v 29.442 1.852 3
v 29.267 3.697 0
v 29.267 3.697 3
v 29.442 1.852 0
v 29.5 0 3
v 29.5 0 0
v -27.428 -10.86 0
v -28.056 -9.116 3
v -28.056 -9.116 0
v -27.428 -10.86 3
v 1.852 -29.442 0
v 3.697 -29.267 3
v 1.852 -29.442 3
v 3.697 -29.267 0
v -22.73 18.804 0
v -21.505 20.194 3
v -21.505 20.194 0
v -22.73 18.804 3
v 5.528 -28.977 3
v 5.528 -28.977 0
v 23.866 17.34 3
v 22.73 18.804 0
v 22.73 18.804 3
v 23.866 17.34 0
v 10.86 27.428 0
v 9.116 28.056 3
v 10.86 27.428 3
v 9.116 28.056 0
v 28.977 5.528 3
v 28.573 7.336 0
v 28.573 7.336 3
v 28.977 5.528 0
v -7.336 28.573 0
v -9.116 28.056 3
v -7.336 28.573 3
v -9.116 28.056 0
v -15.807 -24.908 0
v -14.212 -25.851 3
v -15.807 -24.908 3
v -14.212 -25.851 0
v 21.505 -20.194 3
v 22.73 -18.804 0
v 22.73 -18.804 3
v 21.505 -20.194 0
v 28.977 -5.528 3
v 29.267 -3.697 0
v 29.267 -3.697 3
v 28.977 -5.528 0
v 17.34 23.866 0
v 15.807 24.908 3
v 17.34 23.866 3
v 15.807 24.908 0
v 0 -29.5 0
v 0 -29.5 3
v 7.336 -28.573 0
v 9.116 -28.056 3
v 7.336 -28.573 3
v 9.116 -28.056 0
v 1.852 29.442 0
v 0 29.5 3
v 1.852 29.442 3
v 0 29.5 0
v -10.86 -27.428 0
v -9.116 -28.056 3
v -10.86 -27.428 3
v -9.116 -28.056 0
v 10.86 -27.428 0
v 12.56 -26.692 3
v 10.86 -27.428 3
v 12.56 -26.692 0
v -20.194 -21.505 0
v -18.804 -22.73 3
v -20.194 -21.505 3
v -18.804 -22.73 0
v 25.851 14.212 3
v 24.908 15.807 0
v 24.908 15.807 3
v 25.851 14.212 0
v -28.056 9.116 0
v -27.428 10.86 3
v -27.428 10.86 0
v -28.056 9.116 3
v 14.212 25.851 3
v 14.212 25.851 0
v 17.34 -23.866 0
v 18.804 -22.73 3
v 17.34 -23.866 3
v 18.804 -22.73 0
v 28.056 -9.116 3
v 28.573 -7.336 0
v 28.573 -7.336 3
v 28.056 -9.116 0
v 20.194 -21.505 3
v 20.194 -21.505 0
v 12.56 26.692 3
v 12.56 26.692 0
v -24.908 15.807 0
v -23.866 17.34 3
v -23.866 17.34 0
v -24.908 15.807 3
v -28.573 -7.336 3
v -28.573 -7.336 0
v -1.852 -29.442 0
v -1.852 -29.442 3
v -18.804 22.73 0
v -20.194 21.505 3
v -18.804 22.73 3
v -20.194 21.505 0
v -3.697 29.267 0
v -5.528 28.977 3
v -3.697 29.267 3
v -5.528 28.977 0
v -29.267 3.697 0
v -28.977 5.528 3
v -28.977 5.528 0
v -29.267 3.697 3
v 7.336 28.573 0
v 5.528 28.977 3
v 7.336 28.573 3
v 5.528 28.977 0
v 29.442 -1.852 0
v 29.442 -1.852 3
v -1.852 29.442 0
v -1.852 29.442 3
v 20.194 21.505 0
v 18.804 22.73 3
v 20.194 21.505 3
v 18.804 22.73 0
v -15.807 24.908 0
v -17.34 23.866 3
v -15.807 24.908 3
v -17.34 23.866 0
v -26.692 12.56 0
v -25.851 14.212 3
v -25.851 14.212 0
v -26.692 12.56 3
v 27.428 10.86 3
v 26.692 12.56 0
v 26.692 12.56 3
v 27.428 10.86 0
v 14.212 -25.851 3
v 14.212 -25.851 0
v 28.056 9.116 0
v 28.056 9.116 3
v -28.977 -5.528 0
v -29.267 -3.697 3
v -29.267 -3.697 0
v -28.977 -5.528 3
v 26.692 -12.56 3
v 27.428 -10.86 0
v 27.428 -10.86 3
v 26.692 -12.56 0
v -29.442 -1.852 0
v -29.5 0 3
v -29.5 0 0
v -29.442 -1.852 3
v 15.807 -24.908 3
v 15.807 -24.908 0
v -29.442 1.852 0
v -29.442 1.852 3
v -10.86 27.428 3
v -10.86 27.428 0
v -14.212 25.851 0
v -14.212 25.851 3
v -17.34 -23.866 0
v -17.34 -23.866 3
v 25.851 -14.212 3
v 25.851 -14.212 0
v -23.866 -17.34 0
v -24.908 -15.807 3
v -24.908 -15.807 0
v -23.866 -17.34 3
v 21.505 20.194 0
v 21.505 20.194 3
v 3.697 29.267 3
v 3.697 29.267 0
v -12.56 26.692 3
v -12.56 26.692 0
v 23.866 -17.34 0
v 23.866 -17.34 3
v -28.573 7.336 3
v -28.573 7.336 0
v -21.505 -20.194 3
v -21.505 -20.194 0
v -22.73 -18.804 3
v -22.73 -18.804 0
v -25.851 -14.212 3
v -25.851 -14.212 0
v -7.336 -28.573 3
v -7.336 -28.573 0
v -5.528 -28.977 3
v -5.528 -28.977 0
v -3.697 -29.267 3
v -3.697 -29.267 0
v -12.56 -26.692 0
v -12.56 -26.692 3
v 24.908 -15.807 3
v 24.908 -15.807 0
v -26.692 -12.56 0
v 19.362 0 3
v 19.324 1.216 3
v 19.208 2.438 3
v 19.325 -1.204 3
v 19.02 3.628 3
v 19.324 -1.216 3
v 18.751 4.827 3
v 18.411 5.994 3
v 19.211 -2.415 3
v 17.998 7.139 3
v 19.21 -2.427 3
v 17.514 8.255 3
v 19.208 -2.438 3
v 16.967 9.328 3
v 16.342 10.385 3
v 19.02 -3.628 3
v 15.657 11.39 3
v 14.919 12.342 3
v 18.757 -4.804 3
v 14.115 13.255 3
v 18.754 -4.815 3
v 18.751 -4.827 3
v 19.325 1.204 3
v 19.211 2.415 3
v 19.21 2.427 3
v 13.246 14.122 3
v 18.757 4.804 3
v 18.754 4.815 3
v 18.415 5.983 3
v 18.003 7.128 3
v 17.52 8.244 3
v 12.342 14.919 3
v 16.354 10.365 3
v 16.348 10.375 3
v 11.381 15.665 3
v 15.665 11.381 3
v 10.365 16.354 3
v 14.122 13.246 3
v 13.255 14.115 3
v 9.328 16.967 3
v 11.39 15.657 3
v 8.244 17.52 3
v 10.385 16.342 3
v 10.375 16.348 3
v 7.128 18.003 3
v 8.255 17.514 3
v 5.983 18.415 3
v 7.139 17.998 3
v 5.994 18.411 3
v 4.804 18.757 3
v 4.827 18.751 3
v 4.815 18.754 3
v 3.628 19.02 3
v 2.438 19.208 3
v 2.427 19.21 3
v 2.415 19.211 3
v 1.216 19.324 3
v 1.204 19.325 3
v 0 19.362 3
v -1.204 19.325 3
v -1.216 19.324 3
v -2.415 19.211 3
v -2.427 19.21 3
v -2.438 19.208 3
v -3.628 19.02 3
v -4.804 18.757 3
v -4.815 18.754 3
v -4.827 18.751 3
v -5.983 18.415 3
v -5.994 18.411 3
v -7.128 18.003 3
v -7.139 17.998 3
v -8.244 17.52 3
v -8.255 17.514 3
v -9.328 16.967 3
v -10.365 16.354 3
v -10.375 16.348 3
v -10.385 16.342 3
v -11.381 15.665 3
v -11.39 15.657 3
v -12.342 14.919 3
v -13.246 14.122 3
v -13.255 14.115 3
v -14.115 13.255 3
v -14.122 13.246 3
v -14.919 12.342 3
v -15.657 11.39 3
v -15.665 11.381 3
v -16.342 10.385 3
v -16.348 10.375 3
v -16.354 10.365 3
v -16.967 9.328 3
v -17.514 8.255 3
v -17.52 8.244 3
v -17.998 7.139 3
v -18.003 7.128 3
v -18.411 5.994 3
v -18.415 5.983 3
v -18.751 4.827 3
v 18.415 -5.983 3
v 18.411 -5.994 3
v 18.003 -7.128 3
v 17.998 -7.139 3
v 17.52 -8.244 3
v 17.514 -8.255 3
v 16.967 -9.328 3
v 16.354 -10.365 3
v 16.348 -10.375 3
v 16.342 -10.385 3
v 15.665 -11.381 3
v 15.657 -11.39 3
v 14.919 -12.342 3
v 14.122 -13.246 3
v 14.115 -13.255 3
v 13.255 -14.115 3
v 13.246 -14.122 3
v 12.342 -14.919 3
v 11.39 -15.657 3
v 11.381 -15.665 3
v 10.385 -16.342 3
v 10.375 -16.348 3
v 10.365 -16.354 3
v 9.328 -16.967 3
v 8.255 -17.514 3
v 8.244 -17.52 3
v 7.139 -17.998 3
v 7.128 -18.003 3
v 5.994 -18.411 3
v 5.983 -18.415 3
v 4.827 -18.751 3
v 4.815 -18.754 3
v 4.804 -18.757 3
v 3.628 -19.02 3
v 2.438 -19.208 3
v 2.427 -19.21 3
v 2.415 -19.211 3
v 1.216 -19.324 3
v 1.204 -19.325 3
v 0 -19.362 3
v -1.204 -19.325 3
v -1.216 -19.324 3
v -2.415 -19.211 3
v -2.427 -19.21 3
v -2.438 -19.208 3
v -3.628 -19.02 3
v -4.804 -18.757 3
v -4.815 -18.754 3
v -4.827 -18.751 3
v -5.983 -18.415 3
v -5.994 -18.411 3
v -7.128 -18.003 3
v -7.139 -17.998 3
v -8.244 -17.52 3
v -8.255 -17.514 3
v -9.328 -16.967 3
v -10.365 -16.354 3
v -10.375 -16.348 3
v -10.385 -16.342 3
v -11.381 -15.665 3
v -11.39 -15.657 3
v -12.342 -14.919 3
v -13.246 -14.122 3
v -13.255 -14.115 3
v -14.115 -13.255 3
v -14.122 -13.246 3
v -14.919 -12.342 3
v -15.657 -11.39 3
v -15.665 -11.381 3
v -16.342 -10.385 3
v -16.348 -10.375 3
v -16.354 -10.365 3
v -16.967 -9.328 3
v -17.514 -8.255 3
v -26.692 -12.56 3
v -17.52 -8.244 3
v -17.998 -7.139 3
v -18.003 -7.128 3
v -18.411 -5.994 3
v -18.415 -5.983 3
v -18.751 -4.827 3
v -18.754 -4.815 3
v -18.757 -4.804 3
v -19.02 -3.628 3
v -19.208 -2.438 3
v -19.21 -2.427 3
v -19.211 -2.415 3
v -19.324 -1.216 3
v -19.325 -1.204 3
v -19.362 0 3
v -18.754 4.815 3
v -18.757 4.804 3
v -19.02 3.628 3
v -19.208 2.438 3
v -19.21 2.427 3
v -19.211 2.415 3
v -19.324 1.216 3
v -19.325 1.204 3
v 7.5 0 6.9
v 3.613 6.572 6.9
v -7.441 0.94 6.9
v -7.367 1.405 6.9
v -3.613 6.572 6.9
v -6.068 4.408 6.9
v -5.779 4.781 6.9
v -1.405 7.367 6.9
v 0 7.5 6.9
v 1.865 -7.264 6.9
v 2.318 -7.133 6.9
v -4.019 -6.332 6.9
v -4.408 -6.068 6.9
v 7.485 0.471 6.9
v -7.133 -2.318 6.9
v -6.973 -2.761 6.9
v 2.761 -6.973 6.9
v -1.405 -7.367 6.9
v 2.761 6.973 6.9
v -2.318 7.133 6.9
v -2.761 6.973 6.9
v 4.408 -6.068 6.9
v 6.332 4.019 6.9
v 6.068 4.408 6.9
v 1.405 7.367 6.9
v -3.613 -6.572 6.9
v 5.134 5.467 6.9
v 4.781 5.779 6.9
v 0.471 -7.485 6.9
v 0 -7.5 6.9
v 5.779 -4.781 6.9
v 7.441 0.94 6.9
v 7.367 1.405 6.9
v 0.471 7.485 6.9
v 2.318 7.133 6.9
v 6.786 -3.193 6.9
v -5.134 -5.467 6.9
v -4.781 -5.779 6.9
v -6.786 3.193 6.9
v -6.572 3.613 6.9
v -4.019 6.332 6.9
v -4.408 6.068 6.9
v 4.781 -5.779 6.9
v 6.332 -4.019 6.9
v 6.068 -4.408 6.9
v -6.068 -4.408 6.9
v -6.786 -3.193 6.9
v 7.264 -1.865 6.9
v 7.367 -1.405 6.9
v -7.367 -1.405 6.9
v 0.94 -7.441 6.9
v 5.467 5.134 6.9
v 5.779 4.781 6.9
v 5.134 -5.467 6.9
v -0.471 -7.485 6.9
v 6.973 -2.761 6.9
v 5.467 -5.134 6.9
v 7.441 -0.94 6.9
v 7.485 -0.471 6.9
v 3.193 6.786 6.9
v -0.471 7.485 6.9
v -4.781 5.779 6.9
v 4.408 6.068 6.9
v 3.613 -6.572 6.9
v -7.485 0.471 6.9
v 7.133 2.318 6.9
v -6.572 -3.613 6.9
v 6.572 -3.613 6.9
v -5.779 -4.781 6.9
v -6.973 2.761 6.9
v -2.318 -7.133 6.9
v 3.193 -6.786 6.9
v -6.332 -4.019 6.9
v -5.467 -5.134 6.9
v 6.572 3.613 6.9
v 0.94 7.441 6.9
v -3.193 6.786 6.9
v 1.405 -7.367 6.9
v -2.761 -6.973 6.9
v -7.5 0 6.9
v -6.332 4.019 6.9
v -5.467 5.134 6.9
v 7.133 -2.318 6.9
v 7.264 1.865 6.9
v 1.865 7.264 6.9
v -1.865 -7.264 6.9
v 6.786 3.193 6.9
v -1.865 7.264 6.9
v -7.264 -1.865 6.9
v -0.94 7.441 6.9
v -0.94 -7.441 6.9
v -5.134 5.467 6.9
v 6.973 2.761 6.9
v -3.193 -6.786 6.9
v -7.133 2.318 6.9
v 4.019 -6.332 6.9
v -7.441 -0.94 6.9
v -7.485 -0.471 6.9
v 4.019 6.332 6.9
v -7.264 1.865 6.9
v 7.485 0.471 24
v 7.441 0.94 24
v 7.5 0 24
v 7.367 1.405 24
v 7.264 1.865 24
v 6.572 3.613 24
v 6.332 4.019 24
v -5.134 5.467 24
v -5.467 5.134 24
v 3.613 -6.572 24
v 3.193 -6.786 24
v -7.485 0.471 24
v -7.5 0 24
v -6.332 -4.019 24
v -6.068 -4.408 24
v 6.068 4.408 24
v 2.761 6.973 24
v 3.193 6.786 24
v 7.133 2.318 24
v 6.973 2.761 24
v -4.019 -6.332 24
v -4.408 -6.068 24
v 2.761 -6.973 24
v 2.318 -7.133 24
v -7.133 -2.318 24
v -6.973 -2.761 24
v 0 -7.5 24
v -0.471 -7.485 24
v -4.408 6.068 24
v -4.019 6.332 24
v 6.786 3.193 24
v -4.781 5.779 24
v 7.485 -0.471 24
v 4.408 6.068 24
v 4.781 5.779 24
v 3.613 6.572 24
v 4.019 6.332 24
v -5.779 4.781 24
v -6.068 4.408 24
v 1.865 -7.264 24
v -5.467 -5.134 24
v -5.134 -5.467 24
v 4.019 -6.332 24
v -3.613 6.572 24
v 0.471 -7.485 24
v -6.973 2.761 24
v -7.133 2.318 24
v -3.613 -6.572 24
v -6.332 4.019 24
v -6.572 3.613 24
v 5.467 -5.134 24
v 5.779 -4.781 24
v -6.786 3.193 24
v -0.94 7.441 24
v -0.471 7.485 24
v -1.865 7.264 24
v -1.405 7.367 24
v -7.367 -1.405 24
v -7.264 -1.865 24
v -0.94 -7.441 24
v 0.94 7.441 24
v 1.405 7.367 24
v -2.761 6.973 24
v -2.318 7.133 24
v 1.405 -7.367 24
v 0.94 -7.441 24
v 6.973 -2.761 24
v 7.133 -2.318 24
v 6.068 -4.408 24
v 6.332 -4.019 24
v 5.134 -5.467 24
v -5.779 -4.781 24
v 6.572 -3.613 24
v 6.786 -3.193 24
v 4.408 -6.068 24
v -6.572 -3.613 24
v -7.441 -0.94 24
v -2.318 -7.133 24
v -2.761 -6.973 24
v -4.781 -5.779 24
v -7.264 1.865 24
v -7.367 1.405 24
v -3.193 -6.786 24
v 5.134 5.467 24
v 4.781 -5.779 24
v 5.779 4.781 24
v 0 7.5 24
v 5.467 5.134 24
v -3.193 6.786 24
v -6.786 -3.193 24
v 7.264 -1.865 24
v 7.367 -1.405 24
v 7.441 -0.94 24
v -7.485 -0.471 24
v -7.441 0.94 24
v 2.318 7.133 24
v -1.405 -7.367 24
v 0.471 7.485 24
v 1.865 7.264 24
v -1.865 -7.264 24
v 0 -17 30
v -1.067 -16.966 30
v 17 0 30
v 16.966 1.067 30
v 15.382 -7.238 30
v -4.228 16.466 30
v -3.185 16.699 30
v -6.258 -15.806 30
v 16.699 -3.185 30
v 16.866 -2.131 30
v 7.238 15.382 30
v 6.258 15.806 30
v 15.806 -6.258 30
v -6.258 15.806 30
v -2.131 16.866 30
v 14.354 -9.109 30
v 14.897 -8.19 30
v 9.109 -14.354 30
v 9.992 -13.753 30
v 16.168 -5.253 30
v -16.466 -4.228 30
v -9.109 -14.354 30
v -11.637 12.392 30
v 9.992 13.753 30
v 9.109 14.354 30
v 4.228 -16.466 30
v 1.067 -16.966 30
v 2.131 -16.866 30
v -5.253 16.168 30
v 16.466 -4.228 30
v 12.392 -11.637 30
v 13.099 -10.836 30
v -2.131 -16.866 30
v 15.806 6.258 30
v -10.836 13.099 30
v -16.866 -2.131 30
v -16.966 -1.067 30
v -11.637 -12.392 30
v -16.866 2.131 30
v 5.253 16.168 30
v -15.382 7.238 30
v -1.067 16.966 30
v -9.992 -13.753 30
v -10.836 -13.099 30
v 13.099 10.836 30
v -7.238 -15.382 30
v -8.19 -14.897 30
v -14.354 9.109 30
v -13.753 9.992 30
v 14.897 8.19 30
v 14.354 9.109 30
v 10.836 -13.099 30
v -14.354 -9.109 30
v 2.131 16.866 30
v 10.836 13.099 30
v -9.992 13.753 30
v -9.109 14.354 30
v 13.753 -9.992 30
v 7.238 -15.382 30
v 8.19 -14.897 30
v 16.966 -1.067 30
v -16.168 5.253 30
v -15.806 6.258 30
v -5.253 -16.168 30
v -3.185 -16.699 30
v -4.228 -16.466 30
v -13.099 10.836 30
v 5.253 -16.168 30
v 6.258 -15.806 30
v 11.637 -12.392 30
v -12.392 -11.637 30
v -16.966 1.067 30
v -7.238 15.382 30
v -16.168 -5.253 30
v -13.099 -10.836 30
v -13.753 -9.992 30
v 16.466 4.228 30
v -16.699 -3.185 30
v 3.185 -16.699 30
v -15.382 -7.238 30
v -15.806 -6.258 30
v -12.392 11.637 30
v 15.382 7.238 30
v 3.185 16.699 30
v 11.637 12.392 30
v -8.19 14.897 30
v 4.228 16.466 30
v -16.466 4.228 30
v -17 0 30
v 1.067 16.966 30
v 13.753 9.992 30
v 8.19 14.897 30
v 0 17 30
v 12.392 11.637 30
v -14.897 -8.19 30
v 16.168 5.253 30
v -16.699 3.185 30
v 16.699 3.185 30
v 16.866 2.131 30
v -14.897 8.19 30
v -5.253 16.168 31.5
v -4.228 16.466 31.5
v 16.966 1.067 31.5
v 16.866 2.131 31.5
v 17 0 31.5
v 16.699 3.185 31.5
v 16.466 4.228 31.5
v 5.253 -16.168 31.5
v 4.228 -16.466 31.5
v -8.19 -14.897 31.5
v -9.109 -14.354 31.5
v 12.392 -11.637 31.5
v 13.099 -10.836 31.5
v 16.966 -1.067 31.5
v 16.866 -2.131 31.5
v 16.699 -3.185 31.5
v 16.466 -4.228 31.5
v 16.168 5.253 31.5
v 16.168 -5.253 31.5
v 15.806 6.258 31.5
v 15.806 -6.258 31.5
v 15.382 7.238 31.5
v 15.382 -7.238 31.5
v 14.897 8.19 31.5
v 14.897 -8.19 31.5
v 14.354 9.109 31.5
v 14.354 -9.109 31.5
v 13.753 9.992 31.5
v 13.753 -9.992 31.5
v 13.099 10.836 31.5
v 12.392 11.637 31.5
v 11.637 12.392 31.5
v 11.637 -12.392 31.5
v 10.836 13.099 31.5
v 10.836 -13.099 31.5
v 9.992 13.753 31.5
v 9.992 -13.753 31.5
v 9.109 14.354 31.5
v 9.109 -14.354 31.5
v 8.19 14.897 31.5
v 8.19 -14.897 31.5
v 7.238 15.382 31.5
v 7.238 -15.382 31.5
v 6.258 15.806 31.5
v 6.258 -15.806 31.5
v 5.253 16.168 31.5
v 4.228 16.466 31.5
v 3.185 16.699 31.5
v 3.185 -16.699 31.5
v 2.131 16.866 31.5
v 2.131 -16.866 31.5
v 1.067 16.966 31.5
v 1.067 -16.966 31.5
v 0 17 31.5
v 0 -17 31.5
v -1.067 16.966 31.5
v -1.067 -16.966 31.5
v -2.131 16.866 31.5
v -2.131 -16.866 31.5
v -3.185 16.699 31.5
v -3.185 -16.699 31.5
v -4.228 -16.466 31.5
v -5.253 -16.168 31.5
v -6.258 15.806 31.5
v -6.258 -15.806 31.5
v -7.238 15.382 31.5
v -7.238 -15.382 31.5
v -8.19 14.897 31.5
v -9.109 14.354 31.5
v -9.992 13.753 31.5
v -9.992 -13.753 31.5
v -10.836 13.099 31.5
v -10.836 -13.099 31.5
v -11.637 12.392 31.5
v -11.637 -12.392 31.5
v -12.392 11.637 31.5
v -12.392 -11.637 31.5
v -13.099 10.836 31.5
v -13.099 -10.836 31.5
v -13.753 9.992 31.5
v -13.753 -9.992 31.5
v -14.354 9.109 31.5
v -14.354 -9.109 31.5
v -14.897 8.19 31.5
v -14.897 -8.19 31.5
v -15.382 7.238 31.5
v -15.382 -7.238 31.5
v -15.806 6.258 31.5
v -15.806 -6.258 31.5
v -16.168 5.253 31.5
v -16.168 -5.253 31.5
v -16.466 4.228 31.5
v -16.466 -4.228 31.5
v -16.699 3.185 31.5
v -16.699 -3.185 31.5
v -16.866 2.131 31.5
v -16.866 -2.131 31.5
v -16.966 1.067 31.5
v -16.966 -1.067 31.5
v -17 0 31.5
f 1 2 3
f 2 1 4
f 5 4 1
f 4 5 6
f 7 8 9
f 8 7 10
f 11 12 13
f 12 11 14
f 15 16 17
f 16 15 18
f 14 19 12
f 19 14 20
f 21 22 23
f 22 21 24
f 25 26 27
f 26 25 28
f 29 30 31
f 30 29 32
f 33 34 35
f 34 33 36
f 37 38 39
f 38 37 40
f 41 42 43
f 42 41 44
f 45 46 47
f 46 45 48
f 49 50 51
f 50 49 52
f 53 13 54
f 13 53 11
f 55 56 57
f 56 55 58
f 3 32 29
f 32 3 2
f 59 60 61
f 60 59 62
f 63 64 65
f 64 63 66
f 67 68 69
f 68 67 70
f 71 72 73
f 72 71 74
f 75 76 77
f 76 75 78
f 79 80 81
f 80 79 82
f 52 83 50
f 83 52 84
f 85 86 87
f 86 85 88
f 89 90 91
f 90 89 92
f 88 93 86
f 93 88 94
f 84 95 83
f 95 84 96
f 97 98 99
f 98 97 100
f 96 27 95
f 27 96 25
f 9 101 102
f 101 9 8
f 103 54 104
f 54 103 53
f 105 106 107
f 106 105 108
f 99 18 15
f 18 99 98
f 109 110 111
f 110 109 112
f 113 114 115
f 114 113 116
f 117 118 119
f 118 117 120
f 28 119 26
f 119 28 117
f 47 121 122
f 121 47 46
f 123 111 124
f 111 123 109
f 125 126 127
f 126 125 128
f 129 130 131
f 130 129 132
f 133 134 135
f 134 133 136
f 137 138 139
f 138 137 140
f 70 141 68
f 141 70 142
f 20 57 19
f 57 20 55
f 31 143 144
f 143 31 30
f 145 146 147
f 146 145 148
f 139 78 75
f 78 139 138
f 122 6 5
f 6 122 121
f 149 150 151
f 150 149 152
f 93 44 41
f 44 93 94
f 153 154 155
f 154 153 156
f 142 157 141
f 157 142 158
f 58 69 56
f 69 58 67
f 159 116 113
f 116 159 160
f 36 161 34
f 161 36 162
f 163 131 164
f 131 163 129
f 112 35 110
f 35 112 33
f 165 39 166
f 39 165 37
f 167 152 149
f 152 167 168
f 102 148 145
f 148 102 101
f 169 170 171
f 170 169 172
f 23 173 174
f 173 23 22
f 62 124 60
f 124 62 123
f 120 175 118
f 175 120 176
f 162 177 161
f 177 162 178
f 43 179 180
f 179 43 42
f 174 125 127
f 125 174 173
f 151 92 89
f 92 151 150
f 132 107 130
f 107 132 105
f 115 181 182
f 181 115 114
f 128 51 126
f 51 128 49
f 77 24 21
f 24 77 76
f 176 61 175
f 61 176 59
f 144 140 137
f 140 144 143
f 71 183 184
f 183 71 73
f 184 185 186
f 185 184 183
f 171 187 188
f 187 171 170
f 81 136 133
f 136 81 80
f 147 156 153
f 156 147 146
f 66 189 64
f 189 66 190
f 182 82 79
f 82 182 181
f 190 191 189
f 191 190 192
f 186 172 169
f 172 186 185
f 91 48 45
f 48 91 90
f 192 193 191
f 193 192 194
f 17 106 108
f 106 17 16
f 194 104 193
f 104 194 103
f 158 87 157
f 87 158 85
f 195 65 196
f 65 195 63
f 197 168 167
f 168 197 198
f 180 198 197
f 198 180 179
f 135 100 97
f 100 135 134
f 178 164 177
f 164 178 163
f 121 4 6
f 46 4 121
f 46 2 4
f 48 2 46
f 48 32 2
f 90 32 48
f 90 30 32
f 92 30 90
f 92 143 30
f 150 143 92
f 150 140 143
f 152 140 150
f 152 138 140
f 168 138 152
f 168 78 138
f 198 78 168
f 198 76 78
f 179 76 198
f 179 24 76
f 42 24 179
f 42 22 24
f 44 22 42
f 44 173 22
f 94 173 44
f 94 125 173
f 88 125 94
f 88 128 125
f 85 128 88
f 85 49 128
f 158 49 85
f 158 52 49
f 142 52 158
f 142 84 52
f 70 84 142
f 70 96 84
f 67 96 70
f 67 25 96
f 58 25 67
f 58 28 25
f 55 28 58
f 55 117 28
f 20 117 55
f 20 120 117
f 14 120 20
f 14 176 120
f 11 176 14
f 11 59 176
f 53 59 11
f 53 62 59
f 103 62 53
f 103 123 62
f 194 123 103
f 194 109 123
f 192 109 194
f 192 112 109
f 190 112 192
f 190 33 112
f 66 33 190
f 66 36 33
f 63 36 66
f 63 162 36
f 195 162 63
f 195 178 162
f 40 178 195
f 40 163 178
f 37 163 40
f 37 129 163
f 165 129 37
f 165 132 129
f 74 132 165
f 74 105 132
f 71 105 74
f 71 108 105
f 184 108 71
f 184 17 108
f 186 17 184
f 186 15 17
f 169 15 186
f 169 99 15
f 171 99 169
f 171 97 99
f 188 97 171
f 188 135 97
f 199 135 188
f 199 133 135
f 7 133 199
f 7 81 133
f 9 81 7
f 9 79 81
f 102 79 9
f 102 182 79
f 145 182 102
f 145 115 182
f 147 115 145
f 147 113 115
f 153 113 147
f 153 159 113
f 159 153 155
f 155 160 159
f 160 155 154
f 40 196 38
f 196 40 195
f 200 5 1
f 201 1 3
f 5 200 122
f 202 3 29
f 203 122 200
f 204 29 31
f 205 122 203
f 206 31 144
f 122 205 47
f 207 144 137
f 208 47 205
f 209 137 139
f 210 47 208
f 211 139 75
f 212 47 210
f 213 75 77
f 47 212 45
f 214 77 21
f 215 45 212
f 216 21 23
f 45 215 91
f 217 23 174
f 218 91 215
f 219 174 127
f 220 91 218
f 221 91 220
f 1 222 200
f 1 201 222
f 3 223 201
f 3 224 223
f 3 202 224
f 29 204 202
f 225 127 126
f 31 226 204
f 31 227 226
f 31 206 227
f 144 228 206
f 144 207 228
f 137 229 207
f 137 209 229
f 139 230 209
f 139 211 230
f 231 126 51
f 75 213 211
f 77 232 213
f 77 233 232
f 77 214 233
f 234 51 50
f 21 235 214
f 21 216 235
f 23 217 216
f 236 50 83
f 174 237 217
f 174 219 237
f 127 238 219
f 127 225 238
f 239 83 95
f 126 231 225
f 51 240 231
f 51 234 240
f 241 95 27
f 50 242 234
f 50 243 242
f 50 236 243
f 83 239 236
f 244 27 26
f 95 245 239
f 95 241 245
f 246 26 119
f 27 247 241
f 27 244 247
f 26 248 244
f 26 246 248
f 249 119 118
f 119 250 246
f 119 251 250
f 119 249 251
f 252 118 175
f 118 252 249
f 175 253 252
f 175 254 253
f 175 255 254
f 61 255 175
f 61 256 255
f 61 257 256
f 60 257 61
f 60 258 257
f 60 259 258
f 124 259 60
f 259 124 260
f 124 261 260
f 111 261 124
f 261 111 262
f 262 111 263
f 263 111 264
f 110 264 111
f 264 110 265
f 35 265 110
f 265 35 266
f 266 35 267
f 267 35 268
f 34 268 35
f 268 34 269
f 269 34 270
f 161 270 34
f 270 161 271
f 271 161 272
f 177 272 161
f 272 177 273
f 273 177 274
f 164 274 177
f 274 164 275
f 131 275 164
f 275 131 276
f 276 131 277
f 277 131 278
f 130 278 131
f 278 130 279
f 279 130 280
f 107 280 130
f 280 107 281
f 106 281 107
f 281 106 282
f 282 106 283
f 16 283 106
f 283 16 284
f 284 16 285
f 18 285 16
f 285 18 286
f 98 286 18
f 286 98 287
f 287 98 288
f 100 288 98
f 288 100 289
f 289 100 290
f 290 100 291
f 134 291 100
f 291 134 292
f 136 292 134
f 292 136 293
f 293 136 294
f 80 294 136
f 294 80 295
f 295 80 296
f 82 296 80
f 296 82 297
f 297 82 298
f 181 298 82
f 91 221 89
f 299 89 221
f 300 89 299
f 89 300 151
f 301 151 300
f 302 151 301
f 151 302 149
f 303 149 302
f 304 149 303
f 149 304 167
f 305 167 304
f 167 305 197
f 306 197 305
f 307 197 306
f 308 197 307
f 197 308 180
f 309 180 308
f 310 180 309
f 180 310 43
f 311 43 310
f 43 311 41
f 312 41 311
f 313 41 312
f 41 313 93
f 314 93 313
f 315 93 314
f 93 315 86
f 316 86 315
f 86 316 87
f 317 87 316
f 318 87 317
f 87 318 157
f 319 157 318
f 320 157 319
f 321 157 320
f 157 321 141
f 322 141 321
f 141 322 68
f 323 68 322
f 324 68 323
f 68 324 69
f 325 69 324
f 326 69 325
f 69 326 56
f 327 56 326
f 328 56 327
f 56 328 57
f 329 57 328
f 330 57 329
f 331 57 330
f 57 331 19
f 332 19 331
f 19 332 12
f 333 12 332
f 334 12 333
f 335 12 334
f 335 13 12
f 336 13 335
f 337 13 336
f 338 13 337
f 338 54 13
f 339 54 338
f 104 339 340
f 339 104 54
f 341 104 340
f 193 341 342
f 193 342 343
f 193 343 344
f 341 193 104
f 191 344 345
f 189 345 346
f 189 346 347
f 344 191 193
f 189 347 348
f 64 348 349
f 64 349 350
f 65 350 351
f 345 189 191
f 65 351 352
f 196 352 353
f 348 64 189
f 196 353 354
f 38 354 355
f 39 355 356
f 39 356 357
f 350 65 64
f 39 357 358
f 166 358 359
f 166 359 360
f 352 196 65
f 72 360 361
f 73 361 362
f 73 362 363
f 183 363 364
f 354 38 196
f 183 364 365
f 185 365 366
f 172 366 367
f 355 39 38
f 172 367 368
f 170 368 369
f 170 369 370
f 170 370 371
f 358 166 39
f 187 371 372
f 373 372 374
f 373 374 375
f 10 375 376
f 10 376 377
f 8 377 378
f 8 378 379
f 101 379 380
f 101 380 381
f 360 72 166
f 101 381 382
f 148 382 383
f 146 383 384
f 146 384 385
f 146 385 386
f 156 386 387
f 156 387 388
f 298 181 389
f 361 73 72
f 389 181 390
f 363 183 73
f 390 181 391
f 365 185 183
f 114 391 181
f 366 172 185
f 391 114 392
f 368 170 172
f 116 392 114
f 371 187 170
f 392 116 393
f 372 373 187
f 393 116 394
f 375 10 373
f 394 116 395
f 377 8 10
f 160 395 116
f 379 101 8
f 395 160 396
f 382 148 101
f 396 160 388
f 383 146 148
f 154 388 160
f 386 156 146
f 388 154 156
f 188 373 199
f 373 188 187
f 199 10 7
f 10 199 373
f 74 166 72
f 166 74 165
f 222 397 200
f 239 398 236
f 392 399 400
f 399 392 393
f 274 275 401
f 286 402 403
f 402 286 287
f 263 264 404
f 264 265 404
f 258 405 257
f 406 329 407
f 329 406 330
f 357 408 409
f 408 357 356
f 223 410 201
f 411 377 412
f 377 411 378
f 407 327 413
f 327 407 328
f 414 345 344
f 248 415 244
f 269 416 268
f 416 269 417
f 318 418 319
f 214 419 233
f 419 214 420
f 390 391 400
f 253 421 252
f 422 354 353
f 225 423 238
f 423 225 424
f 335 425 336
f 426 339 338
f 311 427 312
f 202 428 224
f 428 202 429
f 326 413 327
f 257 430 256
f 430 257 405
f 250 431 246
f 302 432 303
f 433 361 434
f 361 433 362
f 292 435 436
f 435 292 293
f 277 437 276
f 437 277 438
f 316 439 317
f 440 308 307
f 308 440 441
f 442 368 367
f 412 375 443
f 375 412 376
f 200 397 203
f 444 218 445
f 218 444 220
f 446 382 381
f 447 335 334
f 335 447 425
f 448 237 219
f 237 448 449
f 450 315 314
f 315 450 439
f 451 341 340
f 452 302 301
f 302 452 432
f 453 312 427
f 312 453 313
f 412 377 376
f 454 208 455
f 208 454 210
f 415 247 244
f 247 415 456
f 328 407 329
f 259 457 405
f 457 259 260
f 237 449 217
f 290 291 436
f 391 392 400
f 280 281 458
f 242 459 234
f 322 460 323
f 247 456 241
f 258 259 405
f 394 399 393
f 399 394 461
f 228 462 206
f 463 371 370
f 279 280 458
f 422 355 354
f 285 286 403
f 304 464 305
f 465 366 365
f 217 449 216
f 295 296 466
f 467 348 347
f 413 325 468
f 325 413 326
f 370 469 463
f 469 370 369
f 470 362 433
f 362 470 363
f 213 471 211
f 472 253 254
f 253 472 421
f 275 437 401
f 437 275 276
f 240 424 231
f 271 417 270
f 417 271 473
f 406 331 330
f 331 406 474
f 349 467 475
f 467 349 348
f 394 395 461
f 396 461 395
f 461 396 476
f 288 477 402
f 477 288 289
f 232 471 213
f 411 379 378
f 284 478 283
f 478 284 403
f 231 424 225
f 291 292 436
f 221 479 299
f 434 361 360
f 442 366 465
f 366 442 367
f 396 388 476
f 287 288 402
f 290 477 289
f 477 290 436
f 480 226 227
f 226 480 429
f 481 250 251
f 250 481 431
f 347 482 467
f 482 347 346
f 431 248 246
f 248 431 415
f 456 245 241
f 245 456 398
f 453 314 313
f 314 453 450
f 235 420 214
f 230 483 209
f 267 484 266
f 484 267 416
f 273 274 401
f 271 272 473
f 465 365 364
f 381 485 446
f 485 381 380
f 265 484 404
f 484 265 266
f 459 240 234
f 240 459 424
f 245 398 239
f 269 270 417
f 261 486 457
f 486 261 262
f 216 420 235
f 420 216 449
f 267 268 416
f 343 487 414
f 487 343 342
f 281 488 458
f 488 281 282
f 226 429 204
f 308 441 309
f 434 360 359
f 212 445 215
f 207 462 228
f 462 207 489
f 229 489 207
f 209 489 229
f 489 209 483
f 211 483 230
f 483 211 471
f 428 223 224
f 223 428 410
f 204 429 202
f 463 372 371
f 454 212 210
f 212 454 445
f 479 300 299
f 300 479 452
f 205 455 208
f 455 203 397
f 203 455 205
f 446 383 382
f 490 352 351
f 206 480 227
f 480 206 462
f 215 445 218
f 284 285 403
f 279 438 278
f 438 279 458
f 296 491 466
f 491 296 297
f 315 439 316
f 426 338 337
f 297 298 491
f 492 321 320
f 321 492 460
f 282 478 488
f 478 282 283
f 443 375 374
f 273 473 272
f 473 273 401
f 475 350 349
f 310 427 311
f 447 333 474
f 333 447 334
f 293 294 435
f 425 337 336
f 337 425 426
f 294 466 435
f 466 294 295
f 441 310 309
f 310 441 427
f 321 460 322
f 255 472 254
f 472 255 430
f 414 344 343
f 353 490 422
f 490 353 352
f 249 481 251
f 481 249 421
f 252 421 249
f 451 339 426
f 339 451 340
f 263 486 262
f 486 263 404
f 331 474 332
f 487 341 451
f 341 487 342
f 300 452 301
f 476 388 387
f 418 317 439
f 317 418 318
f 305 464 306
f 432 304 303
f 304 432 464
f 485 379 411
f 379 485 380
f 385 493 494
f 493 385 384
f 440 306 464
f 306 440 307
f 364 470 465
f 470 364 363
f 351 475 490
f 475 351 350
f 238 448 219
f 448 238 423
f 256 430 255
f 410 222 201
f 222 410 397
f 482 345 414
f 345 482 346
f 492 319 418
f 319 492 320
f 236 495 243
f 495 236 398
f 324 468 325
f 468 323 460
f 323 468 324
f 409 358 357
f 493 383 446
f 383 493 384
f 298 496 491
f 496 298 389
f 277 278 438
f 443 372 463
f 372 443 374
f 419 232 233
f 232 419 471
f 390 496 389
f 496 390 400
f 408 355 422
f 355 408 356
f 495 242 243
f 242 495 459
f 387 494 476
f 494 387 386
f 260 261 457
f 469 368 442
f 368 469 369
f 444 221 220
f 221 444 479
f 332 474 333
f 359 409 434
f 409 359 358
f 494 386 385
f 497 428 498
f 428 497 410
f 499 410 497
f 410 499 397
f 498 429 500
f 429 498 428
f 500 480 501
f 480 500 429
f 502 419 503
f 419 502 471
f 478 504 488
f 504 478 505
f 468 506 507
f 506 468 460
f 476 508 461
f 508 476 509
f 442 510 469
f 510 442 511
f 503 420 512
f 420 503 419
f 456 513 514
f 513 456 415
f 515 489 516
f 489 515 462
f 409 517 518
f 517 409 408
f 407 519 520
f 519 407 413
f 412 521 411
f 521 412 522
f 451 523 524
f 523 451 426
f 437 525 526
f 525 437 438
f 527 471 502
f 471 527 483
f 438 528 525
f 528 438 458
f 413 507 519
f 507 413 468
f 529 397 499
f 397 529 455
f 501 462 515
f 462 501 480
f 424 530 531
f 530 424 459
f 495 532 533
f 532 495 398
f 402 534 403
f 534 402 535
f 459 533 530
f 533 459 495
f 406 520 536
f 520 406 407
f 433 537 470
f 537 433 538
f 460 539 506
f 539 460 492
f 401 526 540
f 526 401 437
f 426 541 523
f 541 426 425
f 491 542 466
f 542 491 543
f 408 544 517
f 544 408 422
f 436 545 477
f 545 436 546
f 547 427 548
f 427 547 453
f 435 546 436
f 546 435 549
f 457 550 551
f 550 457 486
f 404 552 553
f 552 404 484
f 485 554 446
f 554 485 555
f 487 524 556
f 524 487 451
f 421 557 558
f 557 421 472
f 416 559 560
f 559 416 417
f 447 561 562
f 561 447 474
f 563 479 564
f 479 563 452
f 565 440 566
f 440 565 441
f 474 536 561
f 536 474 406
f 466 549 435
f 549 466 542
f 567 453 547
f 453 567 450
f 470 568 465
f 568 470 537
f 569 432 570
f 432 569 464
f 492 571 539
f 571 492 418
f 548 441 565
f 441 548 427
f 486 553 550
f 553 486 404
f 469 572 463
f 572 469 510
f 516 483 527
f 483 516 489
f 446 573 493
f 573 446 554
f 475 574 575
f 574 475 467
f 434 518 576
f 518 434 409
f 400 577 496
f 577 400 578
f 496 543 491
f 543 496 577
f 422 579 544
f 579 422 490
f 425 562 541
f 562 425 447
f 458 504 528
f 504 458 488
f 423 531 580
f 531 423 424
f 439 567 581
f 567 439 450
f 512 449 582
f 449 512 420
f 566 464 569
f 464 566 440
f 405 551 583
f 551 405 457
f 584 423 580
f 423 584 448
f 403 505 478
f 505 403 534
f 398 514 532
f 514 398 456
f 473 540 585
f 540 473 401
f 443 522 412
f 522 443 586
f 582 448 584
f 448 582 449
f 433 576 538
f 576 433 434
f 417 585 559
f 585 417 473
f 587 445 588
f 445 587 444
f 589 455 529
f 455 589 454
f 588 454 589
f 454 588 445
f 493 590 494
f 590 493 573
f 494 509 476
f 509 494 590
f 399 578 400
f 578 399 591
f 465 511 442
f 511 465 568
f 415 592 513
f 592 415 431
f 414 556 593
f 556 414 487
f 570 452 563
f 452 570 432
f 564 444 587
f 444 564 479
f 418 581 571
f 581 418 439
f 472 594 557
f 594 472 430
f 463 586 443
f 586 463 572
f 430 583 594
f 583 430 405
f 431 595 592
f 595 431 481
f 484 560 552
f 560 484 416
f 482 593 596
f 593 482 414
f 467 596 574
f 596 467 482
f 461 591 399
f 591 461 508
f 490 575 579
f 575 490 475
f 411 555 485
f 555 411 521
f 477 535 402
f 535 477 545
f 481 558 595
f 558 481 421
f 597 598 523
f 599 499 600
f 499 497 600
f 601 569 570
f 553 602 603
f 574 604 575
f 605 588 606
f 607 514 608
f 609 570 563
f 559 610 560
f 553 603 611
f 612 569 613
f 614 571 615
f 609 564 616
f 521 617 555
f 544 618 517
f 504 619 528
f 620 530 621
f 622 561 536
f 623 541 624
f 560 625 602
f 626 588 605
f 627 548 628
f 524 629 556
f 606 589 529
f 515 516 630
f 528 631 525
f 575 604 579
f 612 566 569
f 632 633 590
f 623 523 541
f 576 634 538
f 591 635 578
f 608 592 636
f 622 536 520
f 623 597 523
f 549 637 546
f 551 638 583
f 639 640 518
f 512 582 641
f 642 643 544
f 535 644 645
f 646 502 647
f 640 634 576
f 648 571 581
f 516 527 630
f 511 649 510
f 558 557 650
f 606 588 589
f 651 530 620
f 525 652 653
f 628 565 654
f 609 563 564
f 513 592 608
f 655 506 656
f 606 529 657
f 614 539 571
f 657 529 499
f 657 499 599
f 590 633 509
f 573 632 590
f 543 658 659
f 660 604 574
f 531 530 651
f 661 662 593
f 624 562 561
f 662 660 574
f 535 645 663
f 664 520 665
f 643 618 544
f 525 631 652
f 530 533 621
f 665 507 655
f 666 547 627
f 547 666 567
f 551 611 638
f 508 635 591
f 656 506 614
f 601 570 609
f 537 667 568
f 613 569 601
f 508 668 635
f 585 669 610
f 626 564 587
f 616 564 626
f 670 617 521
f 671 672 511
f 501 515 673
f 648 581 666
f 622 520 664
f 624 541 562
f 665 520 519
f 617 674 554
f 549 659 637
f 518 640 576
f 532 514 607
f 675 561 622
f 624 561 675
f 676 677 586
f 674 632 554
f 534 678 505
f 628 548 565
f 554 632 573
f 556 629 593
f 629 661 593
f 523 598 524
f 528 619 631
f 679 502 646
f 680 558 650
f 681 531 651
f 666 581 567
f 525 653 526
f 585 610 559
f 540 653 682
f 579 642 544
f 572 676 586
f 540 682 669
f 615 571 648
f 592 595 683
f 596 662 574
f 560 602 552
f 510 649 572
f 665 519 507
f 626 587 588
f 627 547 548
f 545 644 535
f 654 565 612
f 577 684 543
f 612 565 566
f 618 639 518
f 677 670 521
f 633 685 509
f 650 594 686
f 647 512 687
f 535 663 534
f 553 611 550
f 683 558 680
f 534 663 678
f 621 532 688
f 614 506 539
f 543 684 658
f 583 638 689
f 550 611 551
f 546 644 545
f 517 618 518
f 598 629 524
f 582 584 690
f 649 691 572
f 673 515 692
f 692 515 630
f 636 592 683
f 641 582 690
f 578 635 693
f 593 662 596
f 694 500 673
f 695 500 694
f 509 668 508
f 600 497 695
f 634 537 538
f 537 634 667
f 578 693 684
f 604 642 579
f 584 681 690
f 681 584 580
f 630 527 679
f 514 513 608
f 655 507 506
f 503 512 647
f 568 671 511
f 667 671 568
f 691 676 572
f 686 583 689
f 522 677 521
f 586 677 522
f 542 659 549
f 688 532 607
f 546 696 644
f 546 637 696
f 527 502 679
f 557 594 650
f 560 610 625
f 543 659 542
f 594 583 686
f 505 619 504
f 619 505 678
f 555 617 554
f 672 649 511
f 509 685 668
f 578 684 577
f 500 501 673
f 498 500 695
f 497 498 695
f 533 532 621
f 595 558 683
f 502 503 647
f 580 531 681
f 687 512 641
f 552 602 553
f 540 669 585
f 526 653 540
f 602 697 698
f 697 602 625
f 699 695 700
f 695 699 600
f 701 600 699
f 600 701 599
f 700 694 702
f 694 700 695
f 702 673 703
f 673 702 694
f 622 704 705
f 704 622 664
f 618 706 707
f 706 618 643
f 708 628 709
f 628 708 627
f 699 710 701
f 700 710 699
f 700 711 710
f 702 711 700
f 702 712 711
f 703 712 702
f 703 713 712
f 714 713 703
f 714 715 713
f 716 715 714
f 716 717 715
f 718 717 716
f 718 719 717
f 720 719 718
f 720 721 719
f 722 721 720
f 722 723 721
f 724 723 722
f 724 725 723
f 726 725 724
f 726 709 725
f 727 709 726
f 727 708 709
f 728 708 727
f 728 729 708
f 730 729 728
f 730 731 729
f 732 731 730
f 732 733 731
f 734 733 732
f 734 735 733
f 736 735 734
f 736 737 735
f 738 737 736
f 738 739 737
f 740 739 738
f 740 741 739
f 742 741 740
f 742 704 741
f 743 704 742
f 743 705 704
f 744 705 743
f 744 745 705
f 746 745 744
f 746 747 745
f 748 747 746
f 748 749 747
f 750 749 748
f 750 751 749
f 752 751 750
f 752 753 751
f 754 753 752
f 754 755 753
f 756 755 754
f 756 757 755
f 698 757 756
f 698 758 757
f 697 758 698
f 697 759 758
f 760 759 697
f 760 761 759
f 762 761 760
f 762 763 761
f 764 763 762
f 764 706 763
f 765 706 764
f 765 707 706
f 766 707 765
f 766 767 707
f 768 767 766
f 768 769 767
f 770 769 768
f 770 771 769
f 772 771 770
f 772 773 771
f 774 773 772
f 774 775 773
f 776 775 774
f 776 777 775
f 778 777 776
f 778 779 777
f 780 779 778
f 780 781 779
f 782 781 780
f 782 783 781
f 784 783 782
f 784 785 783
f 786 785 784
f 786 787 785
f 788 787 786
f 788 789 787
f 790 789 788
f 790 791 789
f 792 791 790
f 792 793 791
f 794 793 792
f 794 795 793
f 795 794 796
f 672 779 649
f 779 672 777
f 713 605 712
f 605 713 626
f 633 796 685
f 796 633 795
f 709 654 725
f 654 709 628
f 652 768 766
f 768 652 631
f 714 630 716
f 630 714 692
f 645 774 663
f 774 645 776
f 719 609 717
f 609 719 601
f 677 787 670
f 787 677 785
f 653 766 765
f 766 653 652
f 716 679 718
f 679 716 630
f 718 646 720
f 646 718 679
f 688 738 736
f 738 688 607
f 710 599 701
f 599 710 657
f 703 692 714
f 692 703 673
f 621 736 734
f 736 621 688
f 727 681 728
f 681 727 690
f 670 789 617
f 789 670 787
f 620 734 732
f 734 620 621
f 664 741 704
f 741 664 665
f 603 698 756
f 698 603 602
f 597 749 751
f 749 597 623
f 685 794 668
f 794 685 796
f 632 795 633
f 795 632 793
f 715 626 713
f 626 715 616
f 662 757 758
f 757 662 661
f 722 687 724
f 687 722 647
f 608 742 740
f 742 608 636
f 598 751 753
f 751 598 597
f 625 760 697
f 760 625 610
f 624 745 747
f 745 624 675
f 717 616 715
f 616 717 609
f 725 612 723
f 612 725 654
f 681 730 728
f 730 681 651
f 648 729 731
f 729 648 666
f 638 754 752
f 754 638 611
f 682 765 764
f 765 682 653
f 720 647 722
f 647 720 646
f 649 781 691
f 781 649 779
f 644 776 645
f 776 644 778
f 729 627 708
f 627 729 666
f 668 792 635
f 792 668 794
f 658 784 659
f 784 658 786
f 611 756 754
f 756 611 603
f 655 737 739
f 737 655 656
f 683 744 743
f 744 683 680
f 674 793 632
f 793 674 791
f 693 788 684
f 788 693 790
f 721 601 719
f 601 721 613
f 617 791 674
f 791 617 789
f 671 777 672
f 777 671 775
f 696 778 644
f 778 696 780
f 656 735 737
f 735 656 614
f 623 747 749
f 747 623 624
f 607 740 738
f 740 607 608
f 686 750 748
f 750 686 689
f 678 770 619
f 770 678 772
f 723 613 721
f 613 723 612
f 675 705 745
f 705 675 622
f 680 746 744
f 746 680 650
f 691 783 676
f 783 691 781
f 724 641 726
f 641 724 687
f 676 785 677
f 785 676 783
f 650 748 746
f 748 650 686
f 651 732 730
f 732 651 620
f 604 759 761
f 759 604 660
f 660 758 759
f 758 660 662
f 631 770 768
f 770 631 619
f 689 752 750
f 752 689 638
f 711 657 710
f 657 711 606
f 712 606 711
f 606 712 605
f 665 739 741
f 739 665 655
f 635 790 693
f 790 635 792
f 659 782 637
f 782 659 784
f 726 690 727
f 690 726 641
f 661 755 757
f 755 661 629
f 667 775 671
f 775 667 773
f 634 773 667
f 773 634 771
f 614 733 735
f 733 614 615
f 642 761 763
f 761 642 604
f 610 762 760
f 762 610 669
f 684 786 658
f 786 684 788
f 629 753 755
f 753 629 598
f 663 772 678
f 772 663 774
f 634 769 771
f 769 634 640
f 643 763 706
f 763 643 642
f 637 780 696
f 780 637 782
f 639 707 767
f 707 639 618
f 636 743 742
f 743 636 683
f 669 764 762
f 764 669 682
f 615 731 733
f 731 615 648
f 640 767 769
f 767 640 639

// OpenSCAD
$fn=100;
diam=59;
height=30;

cylinder(3,d=diam);
translate([0,0,2.9]) cylinder(4,r1=(diam/3*2)/2,r2=7.5);

cylinder(height,r=7.5);
translate([0,0,height-6]) cylinder(6,r1=7.5,r2=17);
      
translate([0,0,height]) cylinder(1.5,r=17);
